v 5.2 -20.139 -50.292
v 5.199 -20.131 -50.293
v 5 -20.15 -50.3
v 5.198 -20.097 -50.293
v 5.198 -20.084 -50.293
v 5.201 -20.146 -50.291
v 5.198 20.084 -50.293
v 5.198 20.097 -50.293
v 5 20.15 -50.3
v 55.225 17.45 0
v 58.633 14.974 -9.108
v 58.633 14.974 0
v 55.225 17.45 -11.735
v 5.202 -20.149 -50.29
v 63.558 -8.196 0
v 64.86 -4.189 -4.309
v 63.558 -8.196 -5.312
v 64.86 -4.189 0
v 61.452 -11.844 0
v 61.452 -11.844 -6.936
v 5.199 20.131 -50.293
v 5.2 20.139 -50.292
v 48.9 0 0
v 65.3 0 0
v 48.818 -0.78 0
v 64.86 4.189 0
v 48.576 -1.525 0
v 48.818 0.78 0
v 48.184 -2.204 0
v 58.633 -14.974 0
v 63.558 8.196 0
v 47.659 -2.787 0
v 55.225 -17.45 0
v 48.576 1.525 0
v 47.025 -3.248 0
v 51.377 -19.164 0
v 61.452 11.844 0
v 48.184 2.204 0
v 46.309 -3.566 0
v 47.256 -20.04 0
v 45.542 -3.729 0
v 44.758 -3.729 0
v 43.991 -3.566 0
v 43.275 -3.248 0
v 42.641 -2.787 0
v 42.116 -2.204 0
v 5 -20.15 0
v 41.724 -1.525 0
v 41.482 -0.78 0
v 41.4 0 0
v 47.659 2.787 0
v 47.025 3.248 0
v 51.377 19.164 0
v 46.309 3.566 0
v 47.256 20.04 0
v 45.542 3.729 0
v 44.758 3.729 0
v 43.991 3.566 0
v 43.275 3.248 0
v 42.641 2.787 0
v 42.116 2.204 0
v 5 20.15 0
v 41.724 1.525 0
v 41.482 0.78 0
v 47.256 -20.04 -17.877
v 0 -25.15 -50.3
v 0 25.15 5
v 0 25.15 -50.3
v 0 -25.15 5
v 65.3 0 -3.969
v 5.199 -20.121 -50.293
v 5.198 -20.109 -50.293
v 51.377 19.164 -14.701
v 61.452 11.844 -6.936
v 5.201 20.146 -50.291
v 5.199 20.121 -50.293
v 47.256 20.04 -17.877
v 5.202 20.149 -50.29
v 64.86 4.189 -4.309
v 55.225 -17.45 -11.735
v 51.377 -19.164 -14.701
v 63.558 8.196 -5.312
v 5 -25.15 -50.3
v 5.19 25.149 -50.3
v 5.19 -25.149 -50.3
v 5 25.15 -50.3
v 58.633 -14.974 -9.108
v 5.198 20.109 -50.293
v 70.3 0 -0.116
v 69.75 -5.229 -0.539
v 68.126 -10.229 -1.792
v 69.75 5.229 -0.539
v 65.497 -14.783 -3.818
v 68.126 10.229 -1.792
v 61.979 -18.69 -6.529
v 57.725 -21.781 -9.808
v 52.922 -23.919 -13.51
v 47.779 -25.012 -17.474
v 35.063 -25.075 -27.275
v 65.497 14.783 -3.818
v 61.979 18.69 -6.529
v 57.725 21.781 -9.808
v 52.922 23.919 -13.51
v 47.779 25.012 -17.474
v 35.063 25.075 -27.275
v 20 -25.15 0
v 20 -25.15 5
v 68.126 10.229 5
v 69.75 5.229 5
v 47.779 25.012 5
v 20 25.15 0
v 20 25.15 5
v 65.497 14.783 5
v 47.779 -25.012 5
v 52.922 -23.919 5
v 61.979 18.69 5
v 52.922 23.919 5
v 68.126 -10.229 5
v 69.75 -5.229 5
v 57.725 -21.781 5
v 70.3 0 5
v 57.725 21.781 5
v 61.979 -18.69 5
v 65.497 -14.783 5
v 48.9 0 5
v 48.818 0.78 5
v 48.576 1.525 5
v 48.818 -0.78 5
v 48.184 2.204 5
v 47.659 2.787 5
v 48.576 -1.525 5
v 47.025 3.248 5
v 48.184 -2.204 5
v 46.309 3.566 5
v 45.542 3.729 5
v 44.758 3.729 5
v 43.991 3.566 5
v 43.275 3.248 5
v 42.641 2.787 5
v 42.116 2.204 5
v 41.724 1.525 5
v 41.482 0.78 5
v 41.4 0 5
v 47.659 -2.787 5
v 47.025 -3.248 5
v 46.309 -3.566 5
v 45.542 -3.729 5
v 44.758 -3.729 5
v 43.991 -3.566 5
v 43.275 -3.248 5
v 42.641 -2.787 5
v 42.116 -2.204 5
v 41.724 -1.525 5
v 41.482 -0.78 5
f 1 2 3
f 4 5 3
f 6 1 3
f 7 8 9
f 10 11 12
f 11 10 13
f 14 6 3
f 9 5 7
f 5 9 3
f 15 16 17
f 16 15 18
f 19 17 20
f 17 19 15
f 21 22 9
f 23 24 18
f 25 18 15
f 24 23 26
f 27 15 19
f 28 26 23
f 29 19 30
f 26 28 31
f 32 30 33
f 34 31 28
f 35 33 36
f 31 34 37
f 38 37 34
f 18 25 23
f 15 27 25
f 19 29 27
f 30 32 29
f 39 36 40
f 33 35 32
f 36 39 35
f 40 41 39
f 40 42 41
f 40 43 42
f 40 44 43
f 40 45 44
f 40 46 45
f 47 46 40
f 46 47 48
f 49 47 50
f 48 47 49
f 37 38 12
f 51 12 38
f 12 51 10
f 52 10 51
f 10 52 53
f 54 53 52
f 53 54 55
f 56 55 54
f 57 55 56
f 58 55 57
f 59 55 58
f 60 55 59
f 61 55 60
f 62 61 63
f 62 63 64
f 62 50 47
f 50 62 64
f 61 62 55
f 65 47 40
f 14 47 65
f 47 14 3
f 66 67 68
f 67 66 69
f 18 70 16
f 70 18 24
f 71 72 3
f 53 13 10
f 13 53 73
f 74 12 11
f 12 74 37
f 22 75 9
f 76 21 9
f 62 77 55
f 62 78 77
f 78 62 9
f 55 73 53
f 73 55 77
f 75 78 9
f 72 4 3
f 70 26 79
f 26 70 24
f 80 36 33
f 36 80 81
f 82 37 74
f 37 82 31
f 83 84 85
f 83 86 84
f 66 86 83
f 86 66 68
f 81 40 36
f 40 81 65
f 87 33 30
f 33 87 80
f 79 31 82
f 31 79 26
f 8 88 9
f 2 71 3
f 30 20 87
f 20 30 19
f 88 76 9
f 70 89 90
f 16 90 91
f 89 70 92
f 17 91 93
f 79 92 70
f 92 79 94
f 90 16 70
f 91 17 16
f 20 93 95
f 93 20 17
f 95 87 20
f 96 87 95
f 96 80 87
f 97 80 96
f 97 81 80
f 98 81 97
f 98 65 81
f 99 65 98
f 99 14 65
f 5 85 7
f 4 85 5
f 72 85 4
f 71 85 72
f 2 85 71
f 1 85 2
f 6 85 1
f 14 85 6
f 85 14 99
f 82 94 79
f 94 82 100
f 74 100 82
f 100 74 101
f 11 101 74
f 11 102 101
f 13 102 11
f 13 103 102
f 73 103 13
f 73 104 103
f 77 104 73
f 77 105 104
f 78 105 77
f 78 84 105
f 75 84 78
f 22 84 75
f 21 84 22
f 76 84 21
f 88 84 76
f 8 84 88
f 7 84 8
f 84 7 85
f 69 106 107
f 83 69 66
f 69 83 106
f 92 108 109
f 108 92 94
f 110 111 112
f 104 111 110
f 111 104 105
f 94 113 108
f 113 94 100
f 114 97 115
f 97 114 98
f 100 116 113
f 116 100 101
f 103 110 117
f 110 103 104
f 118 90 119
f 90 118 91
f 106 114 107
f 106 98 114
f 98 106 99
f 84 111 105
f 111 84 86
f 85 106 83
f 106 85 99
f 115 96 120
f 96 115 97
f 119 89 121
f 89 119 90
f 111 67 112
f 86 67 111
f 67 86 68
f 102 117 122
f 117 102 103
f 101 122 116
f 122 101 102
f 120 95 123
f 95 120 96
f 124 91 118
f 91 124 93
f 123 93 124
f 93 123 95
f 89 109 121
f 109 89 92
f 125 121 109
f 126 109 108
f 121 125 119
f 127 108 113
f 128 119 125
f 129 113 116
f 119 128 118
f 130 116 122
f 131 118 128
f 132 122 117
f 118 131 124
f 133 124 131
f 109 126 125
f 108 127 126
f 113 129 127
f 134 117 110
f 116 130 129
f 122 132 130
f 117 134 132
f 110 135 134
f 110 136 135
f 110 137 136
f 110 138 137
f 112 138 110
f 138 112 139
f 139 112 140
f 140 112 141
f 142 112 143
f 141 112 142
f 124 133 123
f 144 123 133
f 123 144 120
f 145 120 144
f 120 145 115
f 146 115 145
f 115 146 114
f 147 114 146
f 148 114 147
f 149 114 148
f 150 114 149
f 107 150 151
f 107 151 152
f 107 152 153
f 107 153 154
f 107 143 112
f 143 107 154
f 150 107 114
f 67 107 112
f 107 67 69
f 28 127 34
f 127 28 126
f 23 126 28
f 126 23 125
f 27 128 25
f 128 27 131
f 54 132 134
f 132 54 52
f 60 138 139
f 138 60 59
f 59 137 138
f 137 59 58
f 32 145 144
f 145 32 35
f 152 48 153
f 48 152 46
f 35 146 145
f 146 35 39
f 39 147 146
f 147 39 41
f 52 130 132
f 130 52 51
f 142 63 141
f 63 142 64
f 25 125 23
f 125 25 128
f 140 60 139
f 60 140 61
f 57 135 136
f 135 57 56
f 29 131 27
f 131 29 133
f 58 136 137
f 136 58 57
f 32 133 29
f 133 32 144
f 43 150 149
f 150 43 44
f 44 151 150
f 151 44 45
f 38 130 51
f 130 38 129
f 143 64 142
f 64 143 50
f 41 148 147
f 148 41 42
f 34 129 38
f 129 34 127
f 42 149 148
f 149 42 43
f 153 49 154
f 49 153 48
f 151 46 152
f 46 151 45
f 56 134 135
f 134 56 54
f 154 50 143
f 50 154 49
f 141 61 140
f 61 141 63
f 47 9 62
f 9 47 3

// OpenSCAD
$fn=30;

base_d      = 50.3;
hole_d      = 7.5;
wall_gap    = 16 + 4;

mag_sp      = 17;

th          = 5;

includeMagnets = 0;
includeScreewHoles = 0;
supportType = "flat"; // round, flat

orientation = 0; //"th" for wall side up, 0 for wall side down


difference() {
	hull() {
		// Base Front
		translate([base_d/2 + wall_gap + orientation, 0, 0]) 
			cylinder(h=th, d=base_d);
		// Add support
		if(orientation == 0) {
			if(supportType == "round"){
				translate([base_d/2 + wall_gap + orientation, 0, 0])
					cylinder(h=th, d=base_d);
				translate([0, -base_d/2, -base_d])
					cube([th, base_d, th]);
			}
			if(supportType == "flat"){
 				translate([base_d/2 + wall_gap + orientation, 0, 0])
 					cylinder(h=th, d=base_d);
 				translate([base_d/2 + wall_gap + orientation, 0, -base_d])
 					cylinder(h=th, d=base_d);
 				translate([0, -base_d/2, -base_d])
 					cube([th, base_d, th]);
			}
		}
		translate([0, -base_d/2, 0])
			cube([wall_gap, base_d, th]);
	}
// camera mount hole
	translate([base_d/2 + wall_gap + orientation, 0, -50])
		cylinder(h=100, d=hole_d);
// Add materal for suppports
	if(orientation == 0) {
		hull(){
			translate([base_d/2 + wall_gap + orientation, 0, -base_d+2])
				cylinder(h=th, d=base_d-th-th);
			translate([base_d/2 + wall_gap + orientation, 0, -th])
				cylinder(h=th, d=base_d-th-th);
			translate([0, (-base_d/2)+th, -base_d])
				cube([th, base_d-th-th, th]);
			translate([0, (-base_d/2)+th, -th])
				cube([th, base_d-th-th, th]);
		}
		// Cut off wedge.
		if(supportType == "flat"){
			hull(){
			// Bottom
			translate([0, (-base_d/2)-th, -base_d-th-th+1])
				cube([th, base_d+10, th]);
			// top Front
			translate([base_d+(base_d/2)-th, (-base_d/2)-th, -th])
				cube([th, base_d+10, th]);
			// Bottom Front
			translate([base_d+(base_d/2)-th, (-base_d/2)-th, -base_d-th])
				cube([th, base_d+10, th]);
			}
		}
	}
//	hull(){
//	translate([th, -6, -.1])
//		cube([12, 12, th+1]);
//	translate([th+6, -6, th])
//		cube([4, 12, 4]);
//	}
}

difference() {
	translate([0, -base_d/2, -base_d]) 
		cube([th, base_d, base_d]);

	//magnet insets
	if(includeMagnets == 1){
		translate([0, mag_sp, -base_d/2]) rotate([0, 90, 0]) magnet();
		translate([0, -mag_sp, -base_d/2]) rotate([0, 90, 0]) magnet();
		translate([0, 0, mag_sp -base_d/2]) rotate([0, 90, 0]) magnet();
		translate([0, 0, -mag_sp -base_d/2]) rotate([0, 90, 0]) magnet();
	}
	//screwholes
	if(includeScreewHoles == 1){
		translate([-1, 0, 9 -base_d/2]) rotate([0, 90, 0]) color("green") cylinder(h=th+2, d=4.4);
		translate([-1, 0, -9 -base_d/2]) rotate([0, 90, 0]) color("green") cylinder(h=th+2, d=4.4);
	}
}

module magnet() {
	magnet_d        = 8.2;
	magnet_h        = 2.2 + 2;
	translate([0, 0, -1]) 
		color("red") 
		cylinder(h=magnet_h+1, d=magnet_d, $fn=100);
}
module side() {
	len = wall_gap + base_d/2;
	translate([0, 0, -len]) difference() {
		cube([len, th, len]);
		rotate([0, 45, 0]) 
			translate([0, -1, -len/5])
			cube([len*2, th+2, len*2]);
	}
}
module side() {
	len = wall_gap + base_d/2;
	translate([0, 0, -len]) difference() {
		cube([len, th, len]);
		rotate([0, 45, 0]) translate([0, -1, -len/5])cube([len*2, th+2, len*2]);
	}
}
